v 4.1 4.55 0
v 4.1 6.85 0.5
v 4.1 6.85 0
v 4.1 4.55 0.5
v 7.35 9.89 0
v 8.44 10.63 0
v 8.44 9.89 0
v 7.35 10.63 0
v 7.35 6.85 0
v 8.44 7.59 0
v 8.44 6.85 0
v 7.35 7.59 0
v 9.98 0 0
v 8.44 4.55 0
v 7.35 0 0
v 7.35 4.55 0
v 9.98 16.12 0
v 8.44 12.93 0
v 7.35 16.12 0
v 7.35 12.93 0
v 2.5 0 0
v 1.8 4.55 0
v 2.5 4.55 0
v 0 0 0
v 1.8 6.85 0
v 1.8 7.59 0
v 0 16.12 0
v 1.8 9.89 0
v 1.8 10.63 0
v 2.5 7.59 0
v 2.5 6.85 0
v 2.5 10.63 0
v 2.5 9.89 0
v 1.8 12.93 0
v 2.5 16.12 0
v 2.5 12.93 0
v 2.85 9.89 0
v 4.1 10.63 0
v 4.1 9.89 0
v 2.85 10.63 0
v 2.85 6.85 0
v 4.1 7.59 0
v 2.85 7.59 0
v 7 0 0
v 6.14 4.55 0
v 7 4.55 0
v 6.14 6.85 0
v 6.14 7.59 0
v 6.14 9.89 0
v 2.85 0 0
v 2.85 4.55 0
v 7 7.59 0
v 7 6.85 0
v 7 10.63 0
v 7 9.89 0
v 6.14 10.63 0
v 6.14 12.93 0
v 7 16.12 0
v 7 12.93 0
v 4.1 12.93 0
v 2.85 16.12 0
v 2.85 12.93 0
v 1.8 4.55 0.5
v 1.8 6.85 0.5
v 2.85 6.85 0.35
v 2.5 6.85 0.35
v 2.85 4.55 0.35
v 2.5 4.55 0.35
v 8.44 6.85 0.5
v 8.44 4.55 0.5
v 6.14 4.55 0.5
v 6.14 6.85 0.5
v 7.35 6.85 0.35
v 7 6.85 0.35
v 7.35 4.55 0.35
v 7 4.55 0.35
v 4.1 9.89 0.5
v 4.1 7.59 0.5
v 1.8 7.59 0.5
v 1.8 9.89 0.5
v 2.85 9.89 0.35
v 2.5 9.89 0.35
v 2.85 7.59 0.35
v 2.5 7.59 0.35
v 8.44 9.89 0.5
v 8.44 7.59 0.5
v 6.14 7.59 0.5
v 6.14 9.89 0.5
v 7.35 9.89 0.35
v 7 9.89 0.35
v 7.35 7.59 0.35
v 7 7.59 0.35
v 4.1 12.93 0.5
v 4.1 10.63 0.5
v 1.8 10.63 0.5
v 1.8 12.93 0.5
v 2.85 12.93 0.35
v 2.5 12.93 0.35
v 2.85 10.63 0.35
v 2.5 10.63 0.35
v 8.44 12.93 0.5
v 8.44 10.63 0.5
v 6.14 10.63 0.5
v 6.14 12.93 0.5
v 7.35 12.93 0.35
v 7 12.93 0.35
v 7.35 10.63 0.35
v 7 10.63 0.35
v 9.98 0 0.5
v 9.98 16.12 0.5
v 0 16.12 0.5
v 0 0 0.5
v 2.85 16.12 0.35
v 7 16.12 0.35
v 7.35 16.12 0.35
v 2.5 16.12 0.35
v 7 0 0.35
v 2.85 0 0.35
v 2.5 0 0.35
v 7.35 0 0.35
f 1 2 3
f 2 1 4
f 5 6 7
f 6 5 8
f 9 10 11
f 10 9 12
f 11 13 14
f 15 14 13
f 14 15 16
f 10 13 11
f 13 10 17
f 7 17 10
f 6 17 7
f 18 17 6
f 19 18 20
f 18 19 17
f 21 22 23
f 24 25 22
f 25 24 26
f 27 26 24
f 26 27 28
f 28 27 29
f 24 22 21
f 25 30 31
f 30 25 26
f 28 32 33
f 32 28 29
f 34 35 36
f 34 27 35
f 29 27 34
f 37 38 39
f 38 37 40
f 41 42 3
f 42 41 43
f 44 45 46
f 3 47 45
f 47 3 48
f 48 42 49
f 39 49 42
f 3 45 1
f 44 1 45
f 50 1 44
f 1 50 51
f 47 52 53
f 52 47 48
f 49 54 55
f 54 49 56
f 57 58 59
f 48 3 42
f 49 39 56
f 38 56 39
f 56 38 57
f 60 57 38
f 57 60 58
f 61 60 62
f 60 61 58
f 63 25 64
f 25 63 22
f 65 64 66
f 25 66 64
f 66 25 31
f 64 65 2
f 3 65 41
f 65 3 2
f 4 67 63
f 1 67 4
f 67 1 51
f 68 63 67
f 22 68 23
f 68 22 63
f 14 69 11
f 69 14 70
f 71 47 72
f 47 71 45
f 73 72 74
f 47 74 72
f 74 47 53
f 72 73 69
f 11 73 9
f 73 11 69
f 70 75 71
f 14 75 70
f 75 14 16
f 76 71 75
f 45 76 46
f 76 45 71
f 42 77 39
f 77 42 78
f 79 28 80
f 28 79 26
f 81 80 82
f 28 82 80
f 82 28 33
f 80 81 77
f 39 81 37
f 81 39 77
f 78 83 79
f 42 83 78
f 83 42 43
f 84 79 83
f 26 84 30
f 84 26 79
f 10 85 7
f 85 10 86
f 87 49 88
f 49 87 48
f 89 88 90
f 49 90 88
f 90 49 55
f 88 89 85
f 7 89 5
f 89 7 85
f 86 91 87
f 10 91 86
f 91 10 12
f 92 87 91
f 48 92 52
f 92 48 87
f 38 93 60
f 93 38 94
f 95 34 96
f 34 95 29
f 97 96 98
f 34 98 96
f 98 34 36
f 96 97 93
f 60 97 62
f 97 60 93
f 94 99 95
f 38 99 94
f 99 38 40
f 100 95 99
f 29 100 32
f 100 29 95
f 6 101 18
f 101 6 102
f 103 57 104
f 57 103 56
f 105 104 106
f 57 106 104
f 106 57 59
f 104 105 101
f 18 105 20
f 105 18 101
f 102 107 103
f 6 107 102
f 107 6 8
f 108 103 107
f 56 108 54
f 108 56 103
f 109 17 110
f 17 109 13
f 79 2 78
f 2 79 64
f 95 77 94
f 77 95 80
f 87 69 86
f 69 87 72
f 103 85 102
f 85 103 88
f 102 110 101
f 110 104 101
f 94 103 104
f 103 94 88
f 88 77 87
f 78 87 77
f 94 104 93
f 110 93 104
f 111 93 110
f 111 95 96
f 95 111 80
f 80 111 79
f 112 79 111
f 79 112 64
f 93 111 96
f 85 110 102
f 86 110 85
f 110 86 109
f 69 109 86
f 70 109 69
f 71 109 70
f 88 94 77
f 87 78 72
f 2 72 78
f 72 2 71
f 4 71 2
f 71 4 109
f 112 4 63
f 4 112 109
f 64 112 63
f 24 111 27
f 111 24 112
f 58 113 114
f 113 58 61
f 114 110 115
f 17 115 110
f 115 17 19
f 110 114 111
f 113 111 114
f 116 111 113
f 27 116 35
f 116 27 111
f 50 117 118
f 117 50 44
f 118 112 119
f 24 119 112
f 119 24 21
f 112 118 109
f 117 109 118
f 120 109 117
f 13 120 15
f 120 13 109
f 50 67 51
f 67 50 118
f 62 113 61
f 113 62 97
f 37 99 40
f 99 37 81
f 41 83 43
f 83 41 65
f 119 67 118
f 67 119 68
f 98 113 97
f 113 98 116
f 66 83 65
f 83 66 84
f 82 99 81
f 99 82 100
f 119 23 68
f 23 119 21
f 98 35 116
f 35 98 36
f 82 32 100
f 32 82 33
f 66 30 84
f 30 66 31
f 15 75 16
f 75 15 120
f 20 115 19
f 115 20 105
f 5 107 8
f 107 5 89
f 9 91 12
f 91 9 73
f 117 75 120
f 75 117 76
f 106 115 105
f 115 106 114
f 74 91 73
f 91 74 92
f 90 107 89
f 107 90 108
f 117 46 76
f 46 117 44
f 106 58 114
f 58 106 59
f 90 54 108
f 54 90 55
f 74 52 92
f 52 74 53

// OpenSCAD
base_length = 2.34;
base_width = 2.34;
base_lr_border = 0.2;
base_tb_border = 0.44;

cavity_length = 1;
cavity_width = 1.45;

// Cell Body
difference(){
    cube([9.98, 16.12, 0.5]);

    dx = 2.34;
    for (j=[0:2]){
        for (i = [0:1]){
        translate([1.8+dx*i+2*i, 4.55+.7*j+dx*j, 0])
            cube([2.3, 2.3, 5]);
        }
    }
   
    // slots for rods
    translate([2.5,0,0])
    cube([0.35, 20, .35]);
    translate([7,0,0])
    cube([0.35, 20, .35]);
}
